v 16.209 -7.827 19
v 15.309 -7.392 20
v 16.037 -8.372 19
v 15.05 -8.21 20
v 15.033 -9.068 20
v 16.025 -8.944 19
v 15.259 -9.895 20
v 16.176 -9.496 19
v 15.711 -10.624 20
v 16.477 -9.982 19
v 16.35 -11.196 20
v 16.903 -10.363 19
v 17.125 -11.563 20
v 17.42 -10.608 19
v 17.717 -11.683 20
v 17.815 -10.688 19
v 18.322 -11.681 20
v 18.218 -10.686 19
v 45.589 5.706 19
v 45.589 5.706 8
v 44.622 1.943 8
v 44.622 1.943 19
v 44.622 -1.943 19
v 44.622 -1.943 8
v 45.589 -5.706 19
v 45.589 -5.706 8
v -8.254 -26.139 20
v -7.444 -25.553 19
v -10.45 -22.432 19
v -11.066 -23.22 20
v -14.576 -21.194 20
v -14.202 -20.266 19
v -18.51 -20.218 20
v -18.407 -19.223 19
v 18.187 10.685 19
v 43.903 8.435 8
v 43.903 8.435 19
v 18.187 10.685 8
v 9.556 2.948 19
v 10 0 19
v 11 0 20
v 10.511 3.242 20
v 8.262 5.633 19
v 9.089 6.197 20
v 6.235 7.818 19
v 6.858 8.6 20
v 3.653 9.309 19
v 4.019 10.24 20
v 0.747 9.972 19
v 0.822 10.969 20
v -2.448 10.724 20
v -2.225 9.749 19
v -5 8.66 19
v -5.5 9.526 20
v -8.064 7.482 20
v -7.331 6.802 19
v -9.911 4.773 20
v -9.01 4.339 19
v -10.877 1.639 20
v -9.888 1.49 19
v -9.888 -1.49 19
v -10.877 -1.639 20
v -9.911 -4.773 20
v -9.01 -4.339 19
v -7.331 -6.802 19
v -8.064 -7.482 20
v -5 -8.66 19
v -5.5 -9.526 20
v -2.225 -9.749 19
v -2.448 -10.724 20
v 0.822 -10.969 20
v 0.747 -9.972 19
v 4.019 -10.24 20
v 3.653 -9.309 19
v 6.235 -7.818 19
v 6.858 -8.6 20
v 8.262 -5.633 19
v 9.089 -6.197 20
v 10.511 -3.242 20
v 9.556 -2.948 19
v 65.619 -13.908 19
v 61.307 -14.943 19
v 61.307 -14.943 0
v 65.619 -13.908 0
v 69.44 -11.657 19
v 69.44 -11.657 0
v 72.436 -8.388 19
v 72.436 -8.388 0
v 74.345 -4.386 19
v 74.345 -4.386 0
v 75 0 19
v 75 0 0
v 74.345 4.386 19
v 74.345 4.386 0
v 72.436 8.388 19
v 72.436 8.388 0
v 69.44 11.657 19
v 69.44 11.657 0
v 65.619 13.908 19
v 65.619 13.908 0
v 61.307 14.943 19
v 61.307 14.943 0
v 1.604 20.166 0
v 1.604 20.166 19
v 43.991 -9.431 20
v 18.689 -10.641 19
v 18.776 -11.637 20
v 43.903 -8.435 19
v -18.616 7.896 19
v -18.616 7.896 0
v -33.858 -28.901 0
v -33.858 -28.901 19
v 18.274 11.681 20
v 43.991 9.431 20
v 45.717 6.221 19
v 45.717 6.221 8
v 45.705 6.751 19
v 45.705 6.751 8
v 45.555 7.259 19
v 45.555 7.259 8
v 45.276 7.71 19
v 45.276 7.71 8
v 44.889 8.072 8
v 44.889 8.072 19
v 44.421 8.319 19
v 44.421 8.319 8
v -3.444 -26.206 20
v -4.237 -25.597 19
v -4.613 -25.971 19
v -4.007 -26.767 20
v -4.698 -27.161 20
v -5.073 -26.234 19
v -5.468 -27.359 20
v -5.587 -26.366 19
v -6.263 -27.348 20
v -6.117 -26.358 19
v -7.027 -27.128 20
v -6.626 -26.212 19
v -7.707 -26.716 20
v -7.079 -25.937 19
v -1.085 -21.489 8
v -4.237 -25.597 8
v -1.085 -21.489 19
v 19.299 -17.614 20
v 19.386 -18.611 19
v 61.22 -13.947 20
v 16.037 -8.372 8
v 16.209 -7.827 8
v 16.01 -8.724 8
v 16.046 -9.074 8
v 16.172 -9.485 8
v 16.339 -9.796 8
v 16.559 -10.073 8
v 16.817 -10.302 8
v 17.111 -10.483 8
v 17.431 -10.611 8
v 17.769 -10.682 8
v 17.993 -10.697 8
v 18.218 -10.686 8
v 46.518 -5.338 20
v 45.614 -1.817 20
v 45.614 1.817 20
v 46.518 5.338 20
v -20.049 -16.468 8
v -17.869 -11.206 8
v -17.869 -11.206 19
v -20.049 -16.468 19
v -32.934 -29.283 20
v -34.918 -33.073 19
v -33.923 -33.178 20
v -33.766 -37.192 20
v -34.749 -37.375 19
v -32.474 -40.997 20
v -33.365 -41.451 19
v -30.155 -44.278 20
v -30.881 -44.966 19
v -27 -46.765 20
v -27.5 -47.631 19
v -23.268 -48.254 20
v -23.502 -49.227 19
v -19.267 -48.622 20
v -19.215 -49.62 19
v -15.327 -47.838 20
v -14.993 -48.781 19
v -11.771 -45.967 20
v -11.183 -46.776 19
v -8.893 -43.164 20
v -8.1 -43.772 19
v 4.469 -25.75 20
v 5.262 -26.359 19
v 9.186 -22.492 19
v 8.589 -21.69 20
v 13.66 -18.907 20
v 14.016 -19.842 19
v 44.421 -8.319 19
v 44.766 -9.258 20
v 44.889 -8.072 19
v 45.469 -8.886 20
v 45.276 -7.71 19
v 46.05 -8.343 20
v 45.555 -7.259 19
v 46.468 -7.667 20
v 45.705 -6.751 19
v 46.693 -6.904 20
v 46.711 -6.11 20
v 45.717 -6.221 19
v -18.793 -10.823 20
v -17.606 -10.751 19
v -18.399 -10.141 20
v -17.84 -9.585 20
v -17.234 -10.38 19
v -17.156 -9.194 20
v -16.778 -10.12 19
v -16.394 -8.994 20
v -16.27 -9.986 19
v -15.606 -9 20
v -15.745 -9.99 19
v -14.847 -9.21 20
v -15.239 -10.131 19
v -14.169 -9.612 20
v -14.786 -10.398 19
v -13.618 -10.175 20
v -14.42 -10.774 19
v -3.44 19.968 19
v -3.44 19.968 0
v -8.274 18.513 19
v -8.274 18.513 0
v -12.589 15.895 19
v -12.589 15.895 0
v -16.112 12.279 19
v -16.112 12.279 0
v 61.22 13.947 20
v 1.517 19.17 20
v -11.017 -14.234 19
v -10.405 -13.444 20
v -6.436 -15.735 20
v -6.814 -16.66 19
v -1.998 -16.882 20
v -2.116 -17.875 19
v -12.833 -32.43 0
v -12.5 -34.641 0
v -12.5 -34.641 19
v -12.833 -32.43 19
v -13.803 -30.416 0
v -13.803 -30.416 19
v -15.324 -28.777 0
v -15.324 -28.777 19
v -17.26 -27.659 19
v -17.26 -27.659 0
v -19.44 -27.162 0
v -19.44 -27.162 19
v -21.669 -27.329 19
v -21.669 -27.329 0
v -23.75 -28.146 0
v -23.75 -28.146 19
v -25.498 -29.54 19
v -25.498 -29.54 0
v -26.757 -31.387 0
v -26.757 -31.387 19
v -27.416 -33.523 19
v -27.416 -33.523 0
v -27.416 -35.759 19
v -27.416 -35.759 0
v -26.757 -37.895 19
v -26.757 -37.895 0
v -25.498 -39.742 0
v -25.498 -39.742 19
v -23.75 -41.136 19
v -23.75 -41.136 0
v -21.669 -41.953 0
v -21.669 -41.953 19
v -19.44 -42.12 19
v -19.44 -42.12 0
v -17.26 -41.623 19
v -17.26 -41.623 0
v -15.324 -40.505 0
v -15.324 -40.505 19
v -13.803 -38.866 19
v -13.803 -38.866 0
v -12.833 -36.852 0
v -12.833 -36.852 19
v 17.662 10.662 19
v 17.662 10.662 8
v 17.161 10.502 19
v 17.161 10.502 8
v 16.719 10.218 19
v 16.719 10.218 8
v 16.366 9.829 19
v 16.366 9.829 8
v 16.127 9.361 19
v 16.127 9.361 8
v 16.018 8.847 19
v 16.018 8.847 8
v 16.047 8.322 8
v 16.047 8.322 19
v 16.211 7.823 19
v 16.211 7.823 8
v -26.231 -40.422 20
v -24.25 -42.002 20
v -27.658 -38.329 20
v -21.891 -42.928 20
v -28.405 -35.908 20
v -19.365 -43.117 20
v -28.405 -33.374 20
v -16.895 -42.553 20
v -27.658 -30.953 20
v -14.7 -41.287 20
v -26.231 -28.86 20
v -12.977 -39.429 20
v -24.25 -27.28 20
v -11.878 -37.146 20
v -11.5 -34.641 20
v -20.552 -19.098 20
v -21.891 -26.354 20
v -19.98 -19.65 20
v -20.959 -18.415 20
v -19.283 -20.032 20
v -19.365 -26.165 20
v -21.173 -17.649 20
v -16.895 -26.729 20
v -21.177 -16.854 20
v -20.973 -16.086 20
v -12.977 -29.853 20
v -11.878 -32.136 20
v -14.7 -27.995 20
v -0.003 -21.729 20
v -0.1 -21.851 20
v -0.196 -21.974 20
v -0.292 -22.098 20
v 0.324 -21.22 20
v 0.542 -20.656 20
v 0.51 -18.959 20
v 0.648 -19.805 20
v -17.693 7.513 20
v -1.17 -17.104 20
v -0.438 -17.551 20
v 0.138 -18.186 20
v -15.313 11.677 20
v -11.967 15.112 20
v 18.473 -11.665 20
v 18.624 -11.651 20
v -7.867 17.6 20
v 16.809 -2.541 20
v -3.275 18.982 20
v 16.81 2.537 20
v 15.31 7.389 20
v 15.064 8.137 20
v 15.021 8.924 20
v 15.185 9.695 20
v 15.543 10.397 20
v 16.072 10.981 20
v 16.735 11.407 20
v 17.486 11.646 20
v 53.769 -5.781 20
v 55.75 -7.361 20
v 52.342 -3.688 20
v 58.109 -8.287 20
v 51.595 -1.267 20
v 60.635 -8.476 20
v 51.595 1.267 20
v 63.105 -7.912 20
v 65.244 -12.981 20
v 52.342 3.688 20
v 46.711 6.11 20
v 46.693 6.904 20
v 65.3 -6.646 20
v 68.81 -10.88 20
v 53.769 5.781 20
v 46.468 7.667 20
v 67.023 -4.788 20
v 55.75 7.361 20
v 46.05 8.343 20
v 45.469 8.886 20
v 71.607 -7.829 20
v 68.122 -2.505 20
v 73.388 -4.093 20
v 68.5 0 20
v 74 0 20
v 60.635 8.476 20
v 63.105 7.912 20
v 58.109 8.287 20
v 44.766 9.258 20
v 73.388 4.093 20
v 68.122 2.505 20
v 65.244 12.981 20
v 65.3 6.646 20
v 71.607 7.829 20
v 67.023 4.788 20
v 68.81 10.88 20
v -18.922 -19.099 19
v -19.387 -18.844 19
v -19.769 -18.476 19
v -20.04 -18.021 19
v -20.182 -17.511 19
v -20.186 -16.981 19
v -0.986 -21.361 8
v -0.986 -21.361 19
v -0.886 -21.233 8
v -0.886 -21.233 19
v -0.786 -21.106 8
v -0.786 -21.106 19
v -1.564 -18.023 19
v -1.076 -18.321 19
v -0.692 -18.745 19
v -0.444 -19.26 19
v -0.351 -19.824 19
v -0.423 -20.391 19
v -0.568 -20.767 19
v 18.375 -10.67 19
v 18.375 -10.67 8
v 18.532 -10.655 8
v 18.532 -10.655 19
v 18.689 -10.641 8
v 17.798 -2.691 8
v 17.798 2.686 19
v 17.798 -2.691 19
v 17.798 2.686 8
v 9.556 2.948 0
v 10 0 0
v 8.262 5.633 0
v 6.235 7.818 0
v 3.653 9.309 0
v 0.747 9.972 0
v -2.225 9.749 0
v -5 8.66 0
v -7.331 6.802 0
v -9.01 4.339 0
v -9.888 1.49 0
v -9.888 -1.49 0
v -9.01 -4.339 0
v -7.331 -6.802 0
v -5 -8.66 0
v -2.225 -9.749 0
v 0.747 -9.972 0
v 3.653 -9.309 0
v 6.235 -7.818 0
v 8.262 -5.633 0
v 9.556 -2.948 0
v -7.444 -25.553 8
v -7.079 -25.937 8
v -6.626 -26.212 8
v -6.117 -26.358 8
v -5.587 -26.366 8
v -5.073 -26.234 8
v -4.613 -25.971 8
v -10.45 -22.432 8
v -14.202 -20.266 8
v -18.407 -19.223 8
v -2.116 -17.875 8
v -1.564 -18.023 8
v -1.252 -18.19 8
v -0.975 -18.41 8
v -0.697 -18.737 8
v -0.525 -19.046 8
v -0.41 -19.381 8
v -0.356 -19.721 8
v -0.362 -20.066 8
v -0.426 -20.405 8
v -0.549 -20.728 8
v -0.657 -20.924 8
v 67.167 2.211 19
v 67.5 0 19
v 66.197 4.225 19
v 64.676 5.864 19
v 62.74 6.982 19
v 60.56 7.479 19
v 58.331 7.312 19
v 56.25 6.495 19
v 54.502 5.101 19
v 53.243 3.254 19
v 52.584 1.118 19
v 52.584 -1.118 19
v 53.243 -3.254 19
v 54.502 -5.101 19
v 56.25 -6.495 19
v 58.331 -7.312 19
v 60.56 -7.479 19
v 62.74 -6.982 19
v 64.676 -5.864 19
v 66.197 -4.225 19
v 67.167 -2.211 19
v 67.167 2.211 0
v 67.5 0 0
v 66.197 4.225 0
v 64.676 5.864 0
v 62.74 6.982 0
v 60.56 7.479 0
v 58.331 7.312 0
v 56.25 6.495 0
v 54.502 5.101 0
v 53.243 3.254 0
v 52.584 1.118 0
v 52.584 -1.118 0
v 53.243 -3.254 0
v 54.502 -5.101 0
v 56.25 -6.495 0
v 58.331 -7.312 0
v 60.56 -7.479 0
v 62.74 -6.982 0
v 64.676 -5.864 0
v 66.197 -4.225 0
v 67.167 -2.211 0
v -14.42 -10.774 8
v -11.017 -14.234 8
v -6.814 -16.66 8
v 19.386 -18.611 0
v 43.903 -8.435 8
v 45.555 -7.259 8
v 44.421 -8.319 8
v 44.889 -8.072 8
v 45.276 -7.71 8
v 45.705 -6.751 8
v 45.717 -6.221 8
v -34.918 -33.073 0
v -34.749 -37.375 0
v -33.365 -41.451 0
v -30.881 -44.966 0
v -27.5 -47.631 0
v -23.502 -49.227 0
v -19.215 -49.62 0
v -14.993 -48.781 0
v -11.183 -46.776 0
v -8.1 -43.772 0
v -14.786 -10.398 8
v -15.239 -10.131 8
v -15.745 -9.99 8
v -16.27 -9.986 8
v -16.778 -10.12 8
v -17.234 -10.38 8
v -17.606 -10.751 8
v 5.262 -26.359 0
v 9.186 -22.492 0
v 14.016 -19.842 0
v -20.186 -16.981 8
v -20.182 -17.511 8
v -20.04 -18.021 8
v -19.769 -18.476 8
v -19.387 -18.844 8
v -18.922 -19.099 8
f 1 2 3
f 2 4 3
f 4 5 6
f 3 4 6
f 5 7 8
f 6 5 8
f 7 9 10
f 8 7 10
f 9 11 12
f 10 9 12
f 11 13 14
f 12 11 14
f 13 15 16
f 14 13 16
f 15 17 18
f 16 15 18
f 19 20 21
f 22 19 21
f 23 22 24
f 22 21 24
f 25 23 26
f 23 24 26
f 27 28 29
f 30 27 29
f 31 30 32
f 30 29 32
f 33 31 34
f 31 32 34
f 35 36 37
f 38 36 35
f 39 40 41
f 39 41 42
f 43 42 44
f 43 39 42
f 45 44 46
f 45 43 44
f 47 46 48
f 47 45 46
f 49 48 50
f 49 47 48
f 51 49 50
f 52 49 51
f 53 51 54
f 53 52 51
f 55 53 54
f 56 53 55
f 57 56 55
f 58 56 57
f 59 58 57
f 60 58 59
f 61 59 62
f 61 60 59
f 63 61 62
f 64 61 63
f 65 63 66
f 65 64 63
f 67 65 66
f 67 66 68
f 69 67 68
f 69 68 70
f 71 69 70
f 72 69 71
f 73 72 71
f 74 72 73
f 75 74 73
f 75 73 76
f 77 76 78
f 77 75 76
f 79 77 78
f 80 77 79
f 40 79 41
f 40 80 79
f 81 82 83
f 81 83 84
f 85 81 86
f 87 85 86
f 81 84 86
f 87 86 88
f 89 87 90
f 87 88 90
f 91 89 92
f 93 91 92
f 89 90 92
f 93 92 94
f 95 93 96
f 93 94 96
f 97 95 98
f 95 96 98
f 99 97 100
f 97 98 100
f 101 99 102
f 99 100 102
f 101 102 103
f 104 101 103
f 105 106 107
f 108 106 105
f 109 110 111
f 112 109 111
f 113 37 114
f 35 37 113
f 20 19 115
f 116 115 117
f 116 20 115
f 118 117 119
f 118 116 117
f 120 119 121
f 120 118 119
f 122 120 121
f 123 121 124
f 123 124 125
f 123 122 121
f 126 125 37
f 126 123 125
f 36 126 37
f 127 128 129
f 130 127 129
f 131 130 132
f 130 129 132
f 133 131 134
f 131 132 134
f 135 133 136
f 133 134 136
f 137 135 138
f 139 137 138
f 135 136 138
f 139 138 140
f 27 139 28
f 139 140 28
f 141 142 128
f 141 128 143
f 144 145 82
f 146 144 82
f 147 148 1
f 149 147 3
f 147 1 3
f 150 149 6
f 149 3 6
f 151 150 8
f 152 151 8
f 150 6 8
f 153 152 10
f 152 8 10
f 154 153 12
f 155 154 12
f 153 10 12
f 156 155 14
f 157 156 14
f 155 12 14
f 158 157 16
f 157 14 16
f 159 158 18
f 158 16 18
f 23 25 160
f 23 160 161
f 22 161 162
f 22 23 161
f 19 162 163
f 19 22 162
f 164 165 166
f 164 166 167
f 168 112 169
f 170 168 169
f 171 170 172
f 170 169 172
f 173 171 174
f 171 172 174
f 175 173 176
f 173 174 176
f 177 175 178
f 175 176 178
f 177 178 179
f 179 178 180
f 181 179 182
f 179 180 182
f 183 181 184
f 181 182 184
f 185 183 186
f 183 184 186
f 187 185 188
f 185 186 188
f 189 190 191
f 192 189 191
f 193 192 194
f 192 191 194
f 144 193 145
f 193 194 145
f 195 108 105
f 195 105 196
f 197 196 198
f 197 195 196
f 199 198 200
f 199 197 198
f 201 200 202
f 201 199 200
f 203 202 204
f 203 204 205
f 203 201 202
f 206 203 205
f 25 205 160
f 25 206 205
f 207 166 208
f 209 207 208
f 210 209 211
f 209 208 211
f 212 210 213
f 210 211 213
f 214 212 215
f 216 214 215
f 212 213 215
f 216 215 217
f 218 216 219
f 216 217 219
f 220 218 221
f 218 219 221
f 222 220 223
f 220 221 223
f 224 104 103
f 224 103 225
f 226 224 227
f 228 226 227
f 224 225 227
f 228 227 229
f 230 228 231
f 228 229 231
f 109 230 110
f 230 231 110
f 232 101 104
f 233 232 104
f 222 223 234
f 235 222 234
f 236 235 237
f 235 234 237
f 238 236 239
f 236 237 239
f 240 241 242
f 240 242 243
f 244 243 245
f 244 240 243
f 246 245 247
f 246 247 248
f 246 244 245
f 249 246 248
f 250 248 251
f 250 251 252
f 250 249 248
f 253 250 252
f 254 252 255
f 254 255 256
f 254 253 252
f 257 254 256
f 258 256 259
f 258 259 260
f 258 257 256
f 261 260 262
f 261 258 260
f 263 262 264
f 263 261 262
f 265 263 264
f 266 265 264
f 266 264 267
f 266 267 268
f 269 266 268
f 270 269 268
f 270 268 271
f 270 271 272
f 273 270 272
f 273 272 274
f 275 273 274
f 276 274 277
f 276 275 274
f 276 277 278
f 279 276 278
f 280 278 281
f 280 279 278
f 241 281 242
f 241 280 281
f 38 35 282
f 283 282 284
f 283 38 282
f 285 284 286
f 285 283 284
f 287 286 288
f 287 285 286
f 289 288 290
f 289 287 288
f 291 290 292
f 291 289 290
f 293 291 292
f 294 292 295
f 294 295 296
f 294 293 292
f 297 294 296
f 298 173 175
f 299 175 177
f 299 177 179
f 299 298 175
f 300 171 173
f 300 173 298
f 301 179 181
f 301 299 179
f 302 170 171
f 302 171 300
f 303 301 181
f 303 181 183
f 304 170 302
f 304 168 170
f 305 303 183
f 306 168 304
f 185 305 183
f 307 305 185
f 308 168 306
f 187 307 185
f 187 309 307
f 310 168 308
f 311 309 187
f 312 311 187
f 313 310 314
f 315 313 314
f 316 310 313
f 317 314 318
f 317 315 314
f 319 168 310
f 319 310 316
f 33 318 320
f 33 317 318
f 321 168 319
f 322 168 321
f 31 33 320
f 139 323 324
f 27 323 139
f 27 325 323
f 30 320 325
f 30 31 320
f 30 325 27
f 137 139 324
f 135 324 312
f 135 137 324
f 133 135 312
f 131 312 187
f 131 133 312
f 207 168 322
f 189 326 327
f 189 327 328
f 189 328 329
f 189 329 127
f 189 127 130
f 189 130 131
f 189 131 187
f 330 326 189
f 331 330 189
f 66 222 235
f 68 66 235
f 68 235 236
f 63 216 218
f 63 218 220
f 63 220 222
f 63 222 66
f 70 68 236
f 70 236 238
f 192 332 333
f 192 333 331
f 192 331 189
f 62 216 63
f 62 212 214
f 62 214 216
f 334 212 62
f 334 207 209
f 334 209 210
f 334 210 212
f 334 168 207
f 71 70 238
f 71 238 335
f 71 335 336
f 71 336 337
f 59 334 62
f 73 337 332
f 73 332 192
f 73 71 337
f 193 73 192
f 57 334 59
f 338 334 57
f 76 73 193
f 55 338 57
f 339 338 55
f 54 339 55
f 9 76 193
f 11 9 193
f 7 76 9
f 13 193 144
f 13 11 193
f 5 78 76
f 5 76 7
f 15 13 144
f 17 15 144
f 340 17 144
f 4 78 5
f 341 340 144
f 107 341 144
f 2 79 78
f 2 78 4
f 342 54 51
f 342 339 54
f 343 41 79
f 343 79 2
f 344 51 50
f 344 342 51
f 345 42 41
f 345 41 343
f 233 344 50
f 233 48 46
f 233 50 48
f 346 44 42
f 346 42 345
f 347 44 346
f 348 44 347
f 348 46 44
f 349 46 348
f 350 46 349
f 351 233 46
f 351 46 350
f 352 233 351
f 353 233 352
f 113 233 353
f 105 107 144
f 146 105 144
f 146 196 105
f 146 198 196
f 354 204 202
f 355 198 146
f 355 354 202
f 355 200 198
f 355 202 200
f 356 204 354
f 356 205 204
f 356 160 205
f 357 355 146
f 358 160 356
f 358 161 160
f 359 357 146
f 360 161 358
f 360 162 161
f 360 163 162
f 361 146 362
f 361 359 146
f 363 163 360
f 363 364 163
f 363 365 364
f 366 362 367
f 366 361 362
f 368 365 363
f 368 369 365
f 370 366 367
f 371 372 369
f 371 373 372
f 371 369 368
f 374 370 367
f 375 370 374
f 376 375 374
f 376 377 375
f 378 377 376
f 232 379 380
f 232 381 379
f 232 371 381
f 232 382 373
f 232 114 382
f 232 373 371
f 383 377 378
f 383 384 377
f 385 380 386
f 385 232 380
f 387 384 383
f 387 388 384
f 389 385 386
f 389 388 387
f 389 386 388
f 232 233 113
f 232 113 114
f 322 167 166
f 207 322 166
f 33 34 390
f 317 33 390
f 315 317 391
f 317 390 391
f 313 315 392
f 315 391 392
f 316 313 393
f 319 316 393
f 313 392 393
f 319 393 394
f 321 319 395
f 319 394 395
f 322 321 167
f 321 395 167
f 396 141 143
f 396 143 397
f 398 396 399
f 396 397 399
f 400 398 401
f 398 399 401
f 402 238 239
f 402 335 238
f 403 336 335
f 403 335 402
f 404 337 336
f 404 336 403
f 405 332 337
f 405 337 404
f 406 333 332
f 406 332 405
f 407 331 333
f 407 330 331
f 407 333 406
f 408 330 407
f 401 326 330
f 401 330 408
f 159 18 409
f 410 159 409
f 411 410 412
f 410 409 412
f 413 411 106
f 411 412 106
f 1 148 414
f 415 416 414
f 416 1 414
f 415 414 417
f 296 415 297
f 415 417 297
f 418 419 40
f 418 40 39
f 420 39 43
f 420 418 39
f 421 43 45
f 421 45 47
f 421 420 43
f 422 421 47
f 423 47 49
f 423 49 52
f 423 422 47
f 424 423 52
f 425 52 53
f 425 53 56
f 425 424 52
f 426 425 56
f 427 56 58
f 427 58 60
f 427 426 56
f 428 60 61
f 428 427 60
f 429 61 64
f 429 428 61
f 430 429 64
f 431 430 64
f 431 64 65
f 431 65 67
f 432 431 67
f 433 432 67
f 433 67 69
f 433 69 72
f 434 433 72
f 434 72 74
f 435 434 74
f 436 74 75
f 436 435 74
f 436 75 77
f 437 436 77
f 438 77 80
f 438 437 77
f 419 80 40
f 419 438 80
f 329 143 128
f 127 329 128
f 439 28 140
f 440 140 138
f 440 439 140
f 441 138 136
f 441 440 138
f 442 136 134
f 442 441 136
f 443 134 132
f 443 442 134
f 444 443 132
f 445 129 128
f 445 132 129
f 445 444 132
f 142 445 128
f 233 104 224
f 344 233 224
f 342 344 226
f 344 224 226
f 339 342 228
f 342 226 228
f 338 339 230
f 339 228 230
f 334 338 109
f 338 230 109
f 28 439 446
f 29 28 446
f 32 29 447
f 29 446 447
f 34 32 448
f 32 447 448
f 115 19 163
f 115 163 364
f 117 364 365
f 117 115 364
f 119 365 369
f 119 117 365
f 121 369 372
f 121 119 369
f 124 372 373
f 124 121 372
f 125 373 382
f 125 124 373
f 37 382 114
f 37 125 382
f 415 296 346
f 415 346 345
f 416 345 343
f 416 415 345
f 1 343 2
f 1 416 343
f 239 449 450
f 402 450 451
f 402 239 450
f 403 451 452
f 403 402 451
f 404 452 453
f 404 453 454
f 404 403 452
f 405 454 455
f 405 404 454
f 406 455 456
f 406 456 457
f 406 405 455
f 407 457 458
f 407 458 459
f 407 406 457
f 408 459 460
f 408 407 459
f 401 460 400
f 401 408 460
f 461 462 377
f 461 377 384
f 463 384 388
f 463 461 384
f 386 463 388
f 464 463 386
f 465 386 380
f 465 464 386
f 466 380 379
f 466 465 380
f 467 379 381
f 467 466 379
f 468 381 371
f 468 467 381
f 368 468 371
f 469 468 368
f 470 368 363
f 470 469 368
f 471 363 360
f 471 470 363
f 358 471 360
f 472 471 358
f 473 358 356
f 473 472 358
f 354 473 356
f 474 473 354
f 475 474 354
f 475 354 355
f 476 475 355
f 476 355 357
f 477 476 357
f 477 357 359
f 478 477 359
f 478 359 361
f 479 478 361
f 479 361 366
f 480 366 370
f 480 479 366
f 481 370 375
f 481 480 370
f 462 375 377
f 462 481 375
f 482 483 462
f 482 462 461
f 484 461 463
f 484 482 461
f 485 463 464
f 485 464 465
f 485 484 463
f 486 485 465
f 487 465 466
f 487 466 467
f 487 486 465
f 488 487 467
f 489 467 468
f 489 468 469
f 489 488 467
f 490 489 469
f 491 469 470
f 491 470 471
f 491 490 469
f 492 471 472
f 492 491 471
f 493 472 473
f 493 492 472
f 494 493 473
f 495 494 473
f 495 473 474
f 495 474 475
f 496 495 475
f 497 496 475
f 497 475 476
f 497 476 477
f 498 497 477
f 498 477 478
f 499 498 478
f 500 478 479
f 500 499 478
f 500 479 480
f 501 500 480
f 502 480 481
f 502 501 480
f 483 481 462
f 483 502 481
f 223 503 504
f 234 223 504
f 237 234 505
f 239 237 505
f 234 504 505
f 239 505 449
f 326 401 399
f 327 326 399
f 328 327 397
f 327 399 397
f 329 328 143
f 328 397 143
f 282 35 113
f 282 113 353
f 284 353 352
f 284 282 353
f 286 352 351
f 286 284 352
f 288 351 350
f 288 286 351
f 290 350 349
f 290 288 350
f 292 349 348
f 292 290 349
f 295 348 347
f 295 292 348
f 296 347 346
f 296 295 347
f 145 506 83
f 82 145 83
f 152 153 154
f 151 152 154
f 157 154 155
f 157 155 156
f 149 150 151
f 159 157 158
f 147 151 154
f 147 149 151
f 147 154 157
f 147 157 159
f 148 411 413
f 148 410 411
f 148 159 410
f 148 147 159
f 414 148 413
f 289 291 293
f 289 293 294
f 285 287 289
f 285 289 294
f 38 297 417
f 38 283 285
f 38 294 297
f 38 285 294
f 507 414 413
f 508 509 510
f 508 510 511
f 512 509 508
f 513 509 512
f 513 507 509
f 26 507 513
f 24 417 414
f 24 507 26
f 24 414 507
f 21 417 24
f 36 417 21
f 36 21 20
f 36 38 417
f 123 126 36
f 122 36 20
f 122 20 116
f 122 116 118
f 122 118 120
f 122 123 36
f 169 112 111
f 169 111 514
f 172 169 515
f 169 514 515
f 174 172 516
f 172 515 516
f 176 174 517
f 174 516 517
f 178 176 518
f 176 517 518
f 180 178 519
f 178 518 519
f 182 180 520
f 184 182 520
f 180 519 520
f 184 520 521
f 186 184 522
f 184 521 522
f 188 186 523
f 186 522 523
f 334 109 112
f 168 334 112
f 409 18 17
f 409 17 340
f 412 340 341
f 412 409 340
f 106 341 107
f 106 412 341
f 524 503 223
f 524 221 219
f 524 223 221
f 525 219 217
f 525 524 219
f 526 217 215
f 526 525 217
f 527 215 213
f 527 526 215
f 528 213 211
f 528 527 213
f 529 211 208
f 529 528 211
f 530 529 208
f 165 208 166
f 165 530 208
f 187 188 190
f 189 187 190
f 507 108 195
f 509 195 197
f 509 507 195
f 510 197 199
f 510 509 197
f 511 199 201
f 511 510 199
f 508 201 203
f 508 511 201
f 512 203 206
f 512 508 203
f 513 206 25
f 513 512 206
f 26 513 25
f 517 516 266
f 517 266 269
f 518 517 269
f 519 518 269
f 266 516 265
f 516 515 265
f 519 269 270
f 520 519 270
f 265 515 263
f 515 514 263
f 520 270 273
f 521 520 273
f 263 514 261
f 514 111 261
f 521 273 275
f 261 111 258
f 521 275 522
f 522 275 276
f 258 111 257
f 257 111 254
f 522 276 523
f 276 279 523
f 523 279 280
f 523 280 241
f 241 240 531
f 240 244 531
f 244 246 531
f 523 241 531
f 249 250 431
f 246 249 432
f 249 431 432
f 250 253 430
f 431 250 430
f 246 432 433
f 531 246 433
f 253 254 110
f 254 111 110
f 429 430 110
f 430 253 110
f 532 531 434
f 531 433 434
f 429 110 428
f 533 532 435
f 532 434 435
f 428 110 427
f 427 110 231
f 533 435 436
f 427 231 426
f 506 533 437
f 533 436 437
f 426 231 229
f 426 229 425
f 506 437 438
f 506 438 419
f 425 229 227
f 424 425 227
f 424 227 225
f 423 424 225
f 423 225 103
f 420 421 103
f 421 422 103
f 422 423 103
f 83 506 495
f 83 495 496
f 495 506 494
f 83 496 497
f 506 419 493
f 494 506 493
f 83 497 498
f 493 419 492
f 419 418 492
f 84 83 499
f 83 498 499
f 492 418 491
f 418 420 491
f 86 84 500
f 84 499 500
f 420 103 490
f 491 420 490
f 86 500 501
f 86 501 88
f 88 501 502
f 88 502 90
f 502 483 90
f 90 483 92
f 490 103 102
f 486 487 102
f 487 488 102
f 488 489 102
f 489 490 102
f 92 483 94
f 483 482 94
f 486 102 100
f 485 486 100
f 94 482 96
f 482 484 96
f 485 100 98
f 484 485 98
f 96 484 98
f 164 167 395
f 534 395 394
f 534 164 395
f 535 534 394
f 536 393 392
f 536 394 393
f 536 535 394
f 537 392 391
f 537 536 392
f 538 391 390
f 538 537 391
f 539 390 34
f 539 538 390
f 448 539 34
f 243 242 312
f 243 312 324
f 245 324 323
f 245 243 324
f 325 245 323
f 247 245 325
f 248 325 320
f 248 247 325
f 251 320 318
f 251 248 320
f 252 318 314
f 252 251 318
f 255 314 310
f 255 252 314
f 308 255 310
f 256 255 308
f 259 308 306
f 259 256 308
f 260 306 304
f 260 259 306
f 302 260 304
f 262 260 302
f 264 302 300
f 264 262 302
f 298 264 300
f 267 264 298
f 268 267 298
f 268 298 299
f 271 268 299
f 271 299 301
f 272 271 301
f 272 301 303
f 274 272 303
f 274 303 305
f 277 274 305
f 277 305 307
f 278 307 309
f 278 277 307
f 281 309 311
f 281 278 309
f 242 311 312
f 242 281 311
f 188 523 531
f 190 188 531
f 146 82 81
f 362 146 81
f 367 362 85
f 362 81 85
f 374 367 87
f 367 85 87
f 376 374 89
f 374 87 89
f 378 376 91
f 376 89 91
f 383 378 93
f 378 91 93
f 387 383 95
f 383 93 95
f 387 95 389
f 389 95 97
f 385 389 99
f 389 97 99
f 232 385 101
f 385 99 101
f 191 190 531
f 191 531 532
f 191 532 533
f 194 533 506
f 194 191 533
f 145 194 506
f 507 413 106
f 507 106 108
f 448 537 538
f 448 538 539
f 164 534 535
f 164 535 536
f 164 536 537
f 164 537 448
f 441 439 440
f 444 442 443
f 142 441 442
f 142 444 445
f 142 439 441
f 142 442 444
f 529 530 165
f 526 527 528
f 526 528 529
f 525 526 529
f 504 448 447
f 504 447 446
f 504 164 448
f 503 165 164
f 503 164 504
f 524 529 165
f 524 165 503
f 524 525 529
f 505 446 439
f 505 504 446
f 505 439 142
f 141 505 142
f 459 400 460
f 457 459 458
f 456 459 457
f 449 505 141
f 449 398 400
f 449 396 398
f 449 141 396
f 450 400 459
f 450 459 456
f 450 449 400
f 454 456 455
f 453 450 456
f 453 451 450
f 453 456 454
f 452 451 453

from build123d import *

# Parameters (mm, degrees)
F0_R     = 7.5
F0_R_2   = 10
F1_DEPTH = 20
F2_R     = 20
F3_T     = -8
F4_R     = 2
F6_SIZE  = 1


# Not quite as in the source:
# - two fillets or chamfers of one size are made in one step


with BuildPart() as f1:
    # F0 (on Top) → F1 (new body)
    with BuildSketch(Plane.XY):
        with BuildLine():
            Line((-18.6164580262, 7.8960385923), (-33.8581929877, -28.9007646659))
            ThreePointArc((-33.8581929877, -28.9007646659), (-27.5, -47.6313972081), (-8.0996998956, -43.7724375865))
            Line((-8.0996998956, -43.7724375865), (10.6191461494, -19.3775624703))
            Line((10.6191461494, -19.3775624703), (61.3073361412, -14.9429204714))
            ThreePointArc((61.3073361412, -14.9429204714), (75, 0), (61.3073361412, 14.9429204714))
            Line((61.3073361412, 14.9429204714), (1.604247479, 20.1662639068))
            ThreePointArc((1.604247479, 20.1662639068), (-10.5143325391, 17.3406073584), (-18.6164580262, 7.8960385923))
        make_face()
        with Locations((-20, -34.6410161514)):
            Circle(F0_R, mode=Mode.SUBTRACT)
        Circle(F0_R_2, mode=Mode.SUBTRACT)
        with Locations((60, 0)):
            Circle(F0_R, mode=Mode.SUBTRACT)
    extrude(amount=F1_DEPTH)

    # F2
    f2_edges = [f1.edges().sort_by_distance(p)[0] for p in [
        (10.619146, -19.377562, 10),
    ]]
    fillet(f2_edges, radius=F2_R)

    # F3
    f3_openings = [f1.faces().sort_by_distance(p)[0] for p in [
        (14.636401, -7.453279, 20),
    ]]
    offset(amount=F3_T, openings=f3_openings)

    # F4
    f4_edges = [f1.edges().sort_by_distance(p)[0] for p in [
        (-6.027772, -27.930812, 14),
        (13.849674, -11.497241, 14),
        (2.246879, -17.859214, 14),
        (46.833398, -8.178667, 14),
        (-21.174906, -19.185609, 14),
        (-16.348079, -7.532617, 14),
        (14.22329, 11.031682, 14),
        (46.833398, 8.178667, 14),
    ]]
    fillet(f4_edges, radius=F4_R)

    # F6
    f6_edges = [f1.edges().sort_by_distance(p)[0] for p in [
        (40.346603, -16.776747, 20),
        (-10, 0, 20),
        (31.29601, -9.538013, 20),
        (31.044956, 9.559977, 20),
        (17.546547, -4.014808, 20),
        (17.547047, 4.012624, 20),
        (-8.997951, -15.58964, 20),
        (44.5, 0, 20),
        (-27.5, -34.641016, 20),
        (-12.25, -21.217622, 20),
        (-2.661098, -23.543277, 20),
        (-18.959422, -13.836957, 20),
        (52.5, 0, 20),
        (18.453201, -10.662615, 20),
        (16.373656, -9.84693, 20),
        (45.430722, -7.49354, 20),
        (16.366311, 9.828794, 20),
        (45.430722, 7.49354, 20),
        (-1.418891, -35.065838, 20),
        (11.509209, -20.999932, 20),
        (75, 0, 20),
        (31.455792, 17.554592, 20),
        (-10.514333, 17.340607, 20),
        (-26.237326, -10.502363, 20),
        (-27.5, -47.631397, 20),
        (-0.936161, -21.297027, 20),
        (-0.501696, -19.09992, 20),
        (-5.851945, -26.379688, 20),
        (-16.270071, -9.986458, 20),
        (-19.919507, -18.257777, 20),
    ]]
    chamfer(f6_edges, length=F6_SIZE)


solid = f1.part
